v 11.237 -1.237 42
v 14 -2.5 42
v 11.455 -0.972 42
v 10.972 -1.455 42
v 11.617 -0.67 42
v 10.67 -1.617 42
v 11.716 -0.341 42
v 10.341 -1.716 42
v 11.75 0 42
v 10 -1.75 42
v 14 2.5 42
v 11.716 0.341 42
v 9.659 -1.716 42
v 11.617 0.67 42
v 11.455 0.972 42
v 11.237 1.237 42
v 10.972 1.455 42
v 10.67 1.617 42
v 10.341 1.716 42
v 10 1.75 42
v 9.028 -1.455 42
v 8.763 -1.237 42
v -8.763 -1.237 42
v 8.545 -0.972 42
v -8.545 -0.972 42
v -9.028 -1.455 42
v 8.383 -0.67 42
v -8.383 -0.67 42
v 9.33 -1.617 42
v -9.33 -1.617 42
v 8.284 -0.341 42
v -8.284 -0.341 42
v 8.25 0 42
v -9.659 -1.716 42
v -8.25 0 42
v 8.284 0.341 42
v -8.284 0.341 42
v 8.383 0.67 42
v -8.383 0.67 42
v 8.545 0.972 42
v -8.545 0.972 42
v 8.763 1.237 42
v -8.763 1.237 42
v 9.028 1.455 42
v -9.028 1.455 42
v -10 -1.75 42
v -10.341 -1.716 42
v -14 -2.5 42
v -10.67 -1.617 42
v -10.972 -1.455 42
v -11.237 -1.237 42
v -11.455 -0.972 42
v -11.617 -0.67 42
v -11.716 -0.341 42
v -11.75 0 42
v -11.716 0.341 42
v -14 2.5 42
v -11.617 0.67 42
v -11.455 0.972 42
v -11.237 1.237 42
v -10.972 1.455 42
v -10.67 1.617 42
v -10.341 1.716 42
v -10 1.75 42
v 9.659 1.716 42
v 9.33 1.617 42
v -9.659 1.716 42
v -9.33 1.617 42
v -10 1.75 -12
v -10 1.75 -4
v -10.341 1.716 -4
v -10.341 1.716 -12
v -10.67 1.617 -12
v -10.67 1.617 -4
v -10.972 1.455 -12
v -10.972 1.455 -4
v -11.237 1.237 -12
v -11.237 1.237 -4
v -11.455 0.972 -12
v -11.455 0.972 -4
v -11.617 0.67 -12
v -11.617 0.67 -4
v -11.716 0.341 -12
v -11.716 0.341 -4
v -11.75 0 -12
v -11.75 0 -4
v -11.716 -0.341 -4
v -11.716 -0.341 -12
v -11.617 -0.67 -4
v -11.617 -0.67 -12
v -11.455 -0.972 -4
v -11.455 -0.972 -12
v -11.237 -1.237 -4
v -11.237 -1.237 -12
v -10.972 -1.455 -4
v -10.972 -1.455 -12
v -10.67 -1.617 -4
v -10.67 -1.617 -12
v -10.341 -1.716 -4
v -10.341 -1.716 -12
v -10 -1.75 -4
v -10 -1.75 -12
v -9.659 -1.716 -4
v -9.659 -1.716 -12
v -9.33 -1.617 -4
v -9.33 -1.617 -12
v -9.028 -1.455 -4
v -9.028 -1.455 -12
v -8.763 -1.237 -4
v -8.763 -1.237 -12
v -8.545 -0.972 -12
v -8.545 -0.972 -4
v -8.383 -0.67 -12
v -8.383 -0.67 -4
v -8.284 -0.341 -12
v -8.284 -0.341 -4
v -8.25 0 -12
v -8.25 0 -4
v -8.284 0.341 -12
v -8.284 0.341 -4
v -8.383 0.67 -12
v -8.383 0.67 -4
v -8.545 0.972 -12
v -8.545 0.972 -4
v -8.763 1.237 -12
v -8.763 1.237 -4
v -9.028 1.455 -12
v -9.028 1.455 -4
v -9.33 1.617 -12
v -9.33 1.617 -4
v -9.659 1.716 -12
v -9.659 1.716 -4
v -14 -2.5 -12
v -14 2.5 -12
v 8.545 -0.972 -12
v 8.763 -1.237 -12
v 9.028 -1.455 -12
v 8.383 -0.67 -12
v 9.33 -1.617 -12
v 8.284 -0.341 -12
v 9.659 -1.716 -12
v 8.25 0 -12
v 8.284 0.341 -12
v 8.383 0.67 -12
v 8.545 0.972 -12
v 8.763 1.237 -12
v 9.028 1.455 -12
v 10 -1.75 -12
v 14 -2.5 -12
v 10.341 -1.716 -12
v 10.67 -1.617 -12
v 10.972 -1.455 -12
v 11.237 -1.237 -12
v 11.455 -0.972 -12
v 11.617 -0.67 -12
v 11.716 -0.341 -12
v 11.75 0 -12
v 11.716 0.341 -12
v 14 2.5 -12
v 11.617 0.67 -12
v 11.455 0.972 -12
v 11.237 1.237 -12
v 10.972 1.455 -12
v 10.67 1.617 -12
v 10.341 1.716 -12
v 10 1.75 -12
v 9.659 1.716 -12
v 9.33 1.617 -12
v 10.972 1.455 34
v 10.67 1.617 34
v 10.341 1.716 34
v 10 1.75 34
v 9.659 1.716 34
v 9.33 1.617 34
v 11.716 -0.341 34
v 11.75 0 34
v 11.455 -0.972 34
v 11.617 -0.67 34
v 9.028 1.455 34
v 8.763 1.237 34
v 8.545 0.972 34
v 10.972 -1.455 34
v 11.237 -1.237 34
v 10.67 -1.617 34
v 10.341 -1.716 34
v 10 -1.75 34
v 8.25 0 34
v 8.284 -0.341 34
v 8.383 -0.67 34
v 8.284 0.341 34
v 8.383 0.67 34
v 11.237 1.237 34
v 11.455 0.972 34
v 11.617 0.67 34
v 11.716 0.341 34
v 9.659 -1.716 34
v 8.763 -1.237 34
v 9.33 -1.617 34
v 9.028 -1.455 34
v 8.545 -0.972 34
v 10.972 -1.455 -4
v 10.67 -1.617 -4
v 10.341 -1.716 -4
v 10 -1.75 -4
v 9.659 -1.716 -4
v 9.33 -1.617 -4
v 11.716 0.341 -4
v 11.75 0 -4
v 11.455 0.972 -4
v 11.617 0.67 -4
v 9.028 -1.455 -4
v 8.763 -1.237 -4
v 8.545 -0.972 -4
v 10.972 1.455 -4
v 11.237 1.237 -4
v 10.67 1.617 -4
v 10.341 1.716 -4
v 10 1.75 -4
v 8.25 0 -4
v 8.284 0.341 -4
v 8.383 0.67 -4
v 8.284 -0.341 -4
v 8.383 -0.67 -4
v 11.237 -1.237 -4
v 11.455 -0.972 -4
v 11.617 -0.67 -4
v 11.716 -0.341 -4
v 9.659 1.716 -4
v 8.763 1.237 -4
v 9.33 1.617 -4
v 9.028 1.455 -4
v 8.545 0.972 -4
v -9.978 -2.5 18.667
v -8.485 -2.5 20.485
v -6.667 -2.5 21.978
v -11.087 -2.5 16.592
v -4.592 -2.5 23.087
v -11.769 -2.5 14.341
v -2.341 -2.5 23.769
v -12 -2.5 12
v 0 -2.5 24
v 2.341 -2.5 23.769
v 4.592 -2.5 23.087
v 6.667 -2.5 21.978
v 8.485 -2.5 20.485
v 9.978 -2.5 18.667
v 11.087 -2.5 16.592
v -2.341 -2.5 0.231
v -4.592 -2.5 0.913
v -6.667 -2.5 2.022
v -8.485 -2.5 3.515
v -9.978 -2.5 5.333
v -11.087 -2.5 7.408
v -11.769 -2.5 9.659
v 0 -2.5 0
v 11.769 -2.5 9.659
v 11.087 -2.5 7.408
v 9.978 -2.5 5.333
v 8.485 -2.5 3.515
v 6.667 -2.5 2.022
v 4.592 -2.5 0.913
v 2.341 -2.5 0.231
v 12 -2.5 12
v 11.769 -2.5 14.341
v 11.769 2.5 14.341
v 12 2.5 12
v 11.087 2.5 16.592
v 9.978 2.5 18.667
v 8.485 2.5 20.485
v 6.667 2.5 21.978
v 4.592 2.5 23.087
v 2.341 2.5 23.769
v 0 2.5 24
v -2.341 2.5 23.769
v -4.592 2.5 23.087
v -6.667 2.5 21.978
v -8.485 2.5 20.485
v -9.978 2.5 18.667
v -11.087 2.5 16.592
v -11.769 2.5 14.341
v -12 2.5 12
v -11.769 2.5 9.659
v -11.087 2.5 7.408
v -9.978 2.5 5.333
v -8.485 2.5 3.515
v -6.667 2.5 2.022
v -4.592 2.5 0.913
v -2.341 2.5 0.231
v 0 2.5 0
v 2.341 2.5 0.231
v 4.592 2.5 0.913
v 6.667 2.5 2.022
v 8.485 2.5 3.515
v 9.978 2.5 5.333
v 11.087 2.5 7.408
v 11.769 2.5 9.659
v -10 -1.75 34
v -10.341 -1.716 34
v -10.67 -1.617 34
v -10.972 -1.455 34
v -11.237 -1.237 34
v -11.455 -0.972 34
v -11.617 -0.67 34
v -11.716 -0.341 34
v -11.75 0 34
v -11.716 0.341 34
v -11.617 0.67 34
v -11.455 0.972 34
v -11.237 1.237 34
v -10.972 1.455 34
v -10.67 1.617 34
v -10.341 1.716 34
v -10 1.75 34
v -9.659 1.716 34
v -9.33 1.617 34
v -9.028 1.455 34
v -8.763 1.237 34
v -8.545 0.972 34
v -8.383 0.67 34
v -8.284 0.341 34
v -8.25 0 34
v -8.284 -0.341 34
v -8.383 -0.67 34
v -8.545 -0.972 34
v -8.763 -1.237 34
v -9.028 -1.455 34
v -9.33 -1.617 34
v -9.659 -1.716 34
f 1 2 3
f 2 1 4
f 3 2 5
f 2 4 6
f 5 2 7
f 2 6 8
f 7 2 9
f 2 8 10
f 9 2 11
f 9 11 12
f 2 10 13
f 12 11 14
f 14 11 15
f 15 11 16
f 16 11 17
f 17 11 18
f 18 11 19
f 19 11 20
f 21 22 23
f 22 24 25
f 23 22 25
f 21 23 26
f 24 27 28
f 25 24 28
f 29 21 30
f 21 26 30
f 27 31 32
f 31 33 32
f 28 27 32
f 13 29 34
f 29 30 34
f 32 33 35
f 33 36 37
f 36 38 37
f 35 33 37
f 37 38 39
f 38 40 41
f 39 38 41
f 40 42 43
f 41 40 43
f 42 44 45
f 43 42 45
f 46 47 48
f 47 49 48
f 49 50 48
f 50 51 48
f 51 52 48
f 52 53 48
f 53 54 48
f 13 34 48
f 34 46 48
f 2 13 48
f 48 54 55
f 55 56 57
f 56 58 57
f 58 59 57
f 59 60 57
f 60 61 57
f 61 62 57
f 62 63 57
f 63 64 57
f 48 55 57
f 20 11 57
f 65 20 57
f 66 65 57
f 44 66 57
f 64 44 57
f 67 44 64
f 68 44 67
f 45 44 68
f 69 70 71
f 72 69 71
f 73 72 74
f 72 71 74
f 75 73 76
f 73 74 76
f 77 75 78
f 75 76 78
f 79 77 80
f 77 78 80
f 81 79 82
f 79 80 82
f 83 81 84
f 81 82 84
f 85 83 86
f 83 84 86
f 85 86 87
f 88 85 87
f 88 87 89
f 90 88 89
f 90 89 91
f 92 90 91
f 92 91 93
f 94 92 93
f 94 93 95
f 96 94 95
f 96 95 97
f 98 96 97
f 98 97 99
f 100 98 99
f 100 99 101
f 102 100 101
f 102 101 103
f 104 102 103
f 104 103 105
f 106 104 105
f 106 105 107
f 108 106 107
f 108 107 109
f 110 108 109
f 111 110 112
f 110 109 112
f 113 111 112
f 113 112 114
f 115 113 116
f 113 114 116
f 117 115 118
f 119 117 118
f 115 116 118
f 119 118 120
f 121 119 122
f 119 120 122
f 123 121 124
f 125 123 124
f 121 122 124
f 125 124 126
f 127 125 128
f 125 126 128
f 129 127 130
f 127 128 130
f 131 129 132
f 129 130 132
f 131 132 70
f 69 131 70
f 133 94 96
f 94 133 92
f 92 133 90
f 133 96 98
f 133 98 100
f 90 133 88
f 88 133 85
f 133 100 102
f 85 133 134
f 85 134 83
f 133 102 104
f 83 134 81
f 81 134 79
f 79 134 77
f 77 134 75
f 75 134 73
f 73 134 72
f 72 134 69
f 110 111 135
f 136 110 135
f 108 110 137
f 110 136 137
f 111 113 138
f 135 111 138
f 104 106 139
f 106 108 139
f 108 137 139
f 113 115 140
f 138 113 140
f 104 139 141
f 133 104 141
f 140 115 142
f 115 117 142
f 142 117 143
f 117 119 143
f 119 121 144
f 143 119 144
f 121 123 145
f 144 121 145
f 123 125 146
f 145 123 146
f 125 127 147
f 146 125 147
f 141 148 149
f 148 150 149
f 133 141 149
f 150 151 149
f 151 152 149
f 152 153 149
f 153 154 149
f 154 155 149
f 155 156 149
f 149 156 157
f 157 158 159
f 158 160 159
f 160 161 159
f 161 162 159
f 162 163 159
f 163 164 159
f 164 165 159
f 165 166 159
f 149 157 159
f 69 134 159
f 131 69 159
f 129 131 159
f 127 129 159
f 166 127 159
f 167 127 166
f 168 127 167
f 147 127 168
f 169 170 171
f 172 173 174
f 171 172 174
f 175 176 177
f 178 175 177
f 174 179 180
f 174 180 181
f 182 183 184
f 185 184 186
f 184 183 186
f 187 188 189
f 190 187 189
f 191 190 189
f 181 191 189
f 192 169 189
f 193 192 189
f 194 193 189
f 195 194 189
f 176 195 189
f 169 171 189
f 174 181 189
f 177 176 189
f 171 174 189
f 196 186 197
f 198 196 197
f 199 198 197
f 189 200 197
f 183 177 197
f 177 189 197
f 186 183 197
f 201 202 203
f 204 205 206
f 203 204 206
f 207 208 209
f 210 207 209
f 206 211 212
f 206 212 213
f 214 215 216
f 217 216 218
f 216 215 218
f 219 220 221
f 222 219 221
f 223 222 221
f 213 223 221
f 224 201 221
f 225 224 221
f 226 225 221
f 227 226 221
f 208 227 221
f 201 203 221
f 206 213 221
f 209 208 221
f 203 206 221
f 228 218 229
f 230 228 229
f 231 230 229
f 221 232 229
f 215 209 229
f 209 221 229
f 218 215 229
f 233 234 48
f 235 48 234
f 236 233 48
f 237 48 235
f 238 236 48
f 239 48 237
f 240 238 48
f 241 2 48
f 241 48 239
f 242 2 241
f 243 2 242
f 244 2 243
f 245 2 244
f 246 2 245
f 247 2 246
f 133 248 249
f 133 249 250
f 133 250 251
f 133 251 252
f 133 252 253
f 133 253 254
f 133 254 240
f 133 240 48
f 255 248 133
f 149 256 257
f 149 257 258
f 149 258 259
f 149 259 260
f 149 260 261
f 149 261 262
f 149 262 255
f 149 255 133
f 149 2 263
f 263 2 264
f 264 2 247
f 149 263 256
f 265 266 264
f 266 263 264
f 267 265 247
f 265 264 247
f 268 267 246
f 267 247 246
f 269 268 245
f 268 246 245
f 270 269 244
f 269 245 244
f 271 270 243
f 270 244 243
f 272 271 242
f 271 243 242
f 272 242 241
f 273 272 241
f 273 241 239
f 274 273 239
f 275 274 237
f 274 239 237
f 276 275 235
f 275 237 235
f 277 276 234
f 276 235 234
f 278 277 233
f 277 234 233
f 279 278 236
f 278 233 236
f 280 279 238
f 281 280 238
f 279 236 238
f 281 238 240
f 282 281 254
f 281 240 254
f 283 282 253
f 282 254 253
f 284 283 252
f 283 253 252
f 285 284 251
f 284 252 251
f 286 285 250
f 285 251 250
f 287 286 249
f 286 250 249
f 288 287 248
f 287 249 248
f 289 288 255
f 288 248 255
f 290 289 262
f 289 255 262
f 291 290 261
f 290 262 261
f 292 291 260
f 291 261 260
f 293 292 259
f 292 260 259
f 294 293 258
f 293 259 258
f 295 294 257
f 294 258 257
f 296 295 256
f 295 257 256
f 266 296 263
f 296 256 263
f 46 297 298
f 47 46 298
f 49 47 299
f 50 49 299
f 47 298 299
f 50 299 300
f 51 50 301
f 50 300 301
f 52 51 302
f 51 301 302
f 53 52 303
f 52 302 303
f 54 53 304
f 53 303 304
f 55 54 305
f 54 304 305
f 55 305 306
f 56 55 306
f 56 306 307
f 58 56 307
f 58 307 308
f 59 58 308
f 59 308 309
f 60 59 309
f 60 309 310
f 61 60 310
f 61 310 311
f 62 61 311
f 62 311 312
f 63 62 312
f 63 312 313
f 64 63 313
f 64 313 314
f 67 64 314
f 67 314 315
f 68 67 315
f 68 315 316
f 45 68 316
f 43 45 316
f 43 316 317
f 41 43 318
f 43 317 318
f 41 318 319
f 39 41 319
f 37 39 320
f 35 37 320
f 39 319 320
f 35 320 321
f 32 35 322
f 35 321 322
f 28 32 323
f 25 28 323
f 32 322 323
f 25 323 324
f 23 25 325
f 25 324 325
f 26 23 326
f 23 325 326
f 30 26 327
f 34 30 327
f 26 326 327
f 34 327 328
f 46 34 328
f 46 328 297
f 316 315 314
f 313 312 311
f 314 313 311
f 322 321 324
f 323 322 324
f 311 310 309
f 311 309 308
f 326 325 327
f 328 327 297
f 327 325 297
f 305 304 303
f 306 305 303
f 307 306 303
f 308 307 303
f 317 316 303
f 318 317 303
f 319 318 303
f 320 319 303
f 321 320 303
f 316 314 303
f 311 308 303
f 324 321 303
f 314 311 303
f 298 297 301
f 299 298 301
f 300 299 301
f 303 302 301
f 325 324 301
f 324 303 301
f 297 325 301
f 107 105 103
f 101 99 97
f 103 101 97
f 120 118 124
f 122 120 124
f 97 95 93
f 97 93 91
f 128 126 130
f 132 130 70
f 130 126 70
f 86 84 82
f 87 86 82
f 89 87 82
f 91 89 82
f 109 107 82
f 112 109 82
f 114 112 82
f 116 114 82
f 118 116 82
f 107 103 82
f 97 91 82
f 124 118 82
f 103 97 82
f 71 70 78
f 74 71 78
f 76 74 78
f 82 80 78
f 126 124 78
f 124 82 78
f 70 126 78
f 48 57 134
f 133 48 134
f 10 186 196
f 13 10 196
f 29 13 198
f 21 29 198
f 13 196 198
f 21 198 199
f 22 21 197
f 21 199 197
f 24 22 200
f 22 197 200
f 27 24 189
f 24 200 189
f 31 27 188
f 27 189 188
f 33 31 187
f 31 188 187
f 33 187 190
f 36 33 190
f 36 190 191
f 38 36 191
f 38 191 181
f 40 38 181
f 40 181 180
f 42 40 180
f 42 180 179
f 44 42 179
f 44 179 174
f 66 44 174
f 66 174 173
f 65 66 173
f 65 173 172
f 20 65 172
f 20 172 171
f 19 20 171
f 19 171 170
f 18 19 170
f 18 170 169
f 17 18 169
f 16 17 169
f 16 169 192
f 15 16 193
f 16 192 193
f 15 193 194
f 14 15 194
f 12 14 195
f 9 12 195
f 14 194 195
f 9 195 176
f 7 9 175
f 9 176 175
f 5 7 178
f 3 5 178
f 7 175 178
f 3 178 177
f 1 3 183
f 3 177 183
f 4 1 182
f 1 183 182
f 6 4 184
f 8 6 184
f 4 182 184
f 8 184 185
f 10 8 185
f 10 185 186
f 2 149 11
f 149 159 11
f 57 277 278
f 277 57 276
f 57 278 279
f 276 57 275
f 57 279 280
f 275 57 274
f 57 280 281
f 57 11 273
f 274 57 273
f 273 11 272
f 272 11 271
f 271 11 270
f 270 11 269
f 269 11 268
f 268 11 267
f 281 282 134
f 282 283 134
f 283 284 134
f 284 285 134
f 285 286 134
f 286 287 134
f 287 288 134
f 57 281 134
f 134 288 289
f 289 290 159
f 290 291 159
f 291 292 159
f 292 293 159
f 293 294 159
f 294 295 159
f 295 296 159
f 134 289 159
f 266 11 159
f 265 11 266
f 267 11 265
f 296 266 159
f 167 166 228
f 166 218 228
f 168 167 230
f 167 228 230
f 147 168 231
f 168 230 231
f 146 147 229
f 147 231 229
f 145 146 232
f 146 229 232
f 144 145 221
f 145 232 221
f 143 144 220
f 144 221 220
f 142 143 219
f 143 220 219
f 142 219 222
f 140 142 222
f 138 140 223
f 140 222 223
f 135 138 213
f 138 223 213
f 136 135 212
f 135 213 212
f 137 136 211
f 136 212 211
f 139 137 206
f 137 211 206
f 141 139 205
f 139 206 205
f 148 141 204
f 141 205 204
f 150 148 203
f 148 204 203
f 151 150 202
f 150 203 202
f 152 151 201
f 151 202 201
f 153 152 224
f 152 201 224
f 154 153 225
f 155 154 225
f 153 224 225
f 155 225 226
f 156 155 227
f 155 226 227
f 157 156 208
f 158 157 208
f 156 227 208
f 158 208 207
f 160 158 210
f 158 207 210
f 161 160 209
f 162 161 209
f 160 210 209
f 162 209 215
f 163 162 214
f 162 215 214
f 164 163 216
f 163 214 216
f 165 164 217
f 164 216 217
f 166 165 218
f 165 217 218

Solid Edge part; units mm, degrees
sketch "Sketch1" plane through (0, 0, 0) normal (0, -1, 0) x (1, 0, 0)
  line L0 (-14, -12) -> (14, -12)
  line L1 (14, -12) -> (14, 12)
  line L2 (14, 12) -> (-14, 12)
  line L3 (-14, 12) -> (-14, -12)
  dimension "D1" = 24
  dimension "D2" = 28
extrude "Protrusion1" add sketch "Sketch1" along normal mid plane 5
sketch "Sketch2" plane through (0, -2.5, 0) normal (0, -1, 0) x (1, 0, 0)
  circle A0 centre (0, 12) radius 12
  dimension "D1" = 24
extrude "Extrusionsausschnitt_1" cut sketch "Sketch2" against normal blind 221
hole "Bohrung_1" at (-10, 0, -12) direction (0, 0, 1) diameter 3.5 depth 8
hole "Hole1" at (10, 0, -12) direction (0, 0, 1) diameter 3.5 depth 8
mirror "Mirror1" about plane through (-13.5, 0, 12) normal (0, 0, 1) of "Protrusion1", "Extrusionsausschnitt_1"
sketch "Sketch3" plane through (0, 0, 36) normal (0, 0, 1) x (1, 0, 0)
  line L0 (-14, 2.5) -> (14, 2.5)
  line L1 (14, 2.5) -> (14, -2.5)
  line L2 (14, -2.5) -> (-14, -2.5)
  line L3 (-14, -2.5) -> (-14, 2.5)
extrude "Extrusionsausprägung_3" add sketch "Sketch3" along normal blind 6
hole "Bohrung_5" at (-10, 0, 42) direction (0, 0, -1) diameter 3.5 depth 8
hole "Hole2" at (10, 0, 42) direction (0, 0, -1) diameter 3.5 depth 8
properties material "Aluminiumlegierung:3.0205, Al 99.0, EN-AW 1200"
